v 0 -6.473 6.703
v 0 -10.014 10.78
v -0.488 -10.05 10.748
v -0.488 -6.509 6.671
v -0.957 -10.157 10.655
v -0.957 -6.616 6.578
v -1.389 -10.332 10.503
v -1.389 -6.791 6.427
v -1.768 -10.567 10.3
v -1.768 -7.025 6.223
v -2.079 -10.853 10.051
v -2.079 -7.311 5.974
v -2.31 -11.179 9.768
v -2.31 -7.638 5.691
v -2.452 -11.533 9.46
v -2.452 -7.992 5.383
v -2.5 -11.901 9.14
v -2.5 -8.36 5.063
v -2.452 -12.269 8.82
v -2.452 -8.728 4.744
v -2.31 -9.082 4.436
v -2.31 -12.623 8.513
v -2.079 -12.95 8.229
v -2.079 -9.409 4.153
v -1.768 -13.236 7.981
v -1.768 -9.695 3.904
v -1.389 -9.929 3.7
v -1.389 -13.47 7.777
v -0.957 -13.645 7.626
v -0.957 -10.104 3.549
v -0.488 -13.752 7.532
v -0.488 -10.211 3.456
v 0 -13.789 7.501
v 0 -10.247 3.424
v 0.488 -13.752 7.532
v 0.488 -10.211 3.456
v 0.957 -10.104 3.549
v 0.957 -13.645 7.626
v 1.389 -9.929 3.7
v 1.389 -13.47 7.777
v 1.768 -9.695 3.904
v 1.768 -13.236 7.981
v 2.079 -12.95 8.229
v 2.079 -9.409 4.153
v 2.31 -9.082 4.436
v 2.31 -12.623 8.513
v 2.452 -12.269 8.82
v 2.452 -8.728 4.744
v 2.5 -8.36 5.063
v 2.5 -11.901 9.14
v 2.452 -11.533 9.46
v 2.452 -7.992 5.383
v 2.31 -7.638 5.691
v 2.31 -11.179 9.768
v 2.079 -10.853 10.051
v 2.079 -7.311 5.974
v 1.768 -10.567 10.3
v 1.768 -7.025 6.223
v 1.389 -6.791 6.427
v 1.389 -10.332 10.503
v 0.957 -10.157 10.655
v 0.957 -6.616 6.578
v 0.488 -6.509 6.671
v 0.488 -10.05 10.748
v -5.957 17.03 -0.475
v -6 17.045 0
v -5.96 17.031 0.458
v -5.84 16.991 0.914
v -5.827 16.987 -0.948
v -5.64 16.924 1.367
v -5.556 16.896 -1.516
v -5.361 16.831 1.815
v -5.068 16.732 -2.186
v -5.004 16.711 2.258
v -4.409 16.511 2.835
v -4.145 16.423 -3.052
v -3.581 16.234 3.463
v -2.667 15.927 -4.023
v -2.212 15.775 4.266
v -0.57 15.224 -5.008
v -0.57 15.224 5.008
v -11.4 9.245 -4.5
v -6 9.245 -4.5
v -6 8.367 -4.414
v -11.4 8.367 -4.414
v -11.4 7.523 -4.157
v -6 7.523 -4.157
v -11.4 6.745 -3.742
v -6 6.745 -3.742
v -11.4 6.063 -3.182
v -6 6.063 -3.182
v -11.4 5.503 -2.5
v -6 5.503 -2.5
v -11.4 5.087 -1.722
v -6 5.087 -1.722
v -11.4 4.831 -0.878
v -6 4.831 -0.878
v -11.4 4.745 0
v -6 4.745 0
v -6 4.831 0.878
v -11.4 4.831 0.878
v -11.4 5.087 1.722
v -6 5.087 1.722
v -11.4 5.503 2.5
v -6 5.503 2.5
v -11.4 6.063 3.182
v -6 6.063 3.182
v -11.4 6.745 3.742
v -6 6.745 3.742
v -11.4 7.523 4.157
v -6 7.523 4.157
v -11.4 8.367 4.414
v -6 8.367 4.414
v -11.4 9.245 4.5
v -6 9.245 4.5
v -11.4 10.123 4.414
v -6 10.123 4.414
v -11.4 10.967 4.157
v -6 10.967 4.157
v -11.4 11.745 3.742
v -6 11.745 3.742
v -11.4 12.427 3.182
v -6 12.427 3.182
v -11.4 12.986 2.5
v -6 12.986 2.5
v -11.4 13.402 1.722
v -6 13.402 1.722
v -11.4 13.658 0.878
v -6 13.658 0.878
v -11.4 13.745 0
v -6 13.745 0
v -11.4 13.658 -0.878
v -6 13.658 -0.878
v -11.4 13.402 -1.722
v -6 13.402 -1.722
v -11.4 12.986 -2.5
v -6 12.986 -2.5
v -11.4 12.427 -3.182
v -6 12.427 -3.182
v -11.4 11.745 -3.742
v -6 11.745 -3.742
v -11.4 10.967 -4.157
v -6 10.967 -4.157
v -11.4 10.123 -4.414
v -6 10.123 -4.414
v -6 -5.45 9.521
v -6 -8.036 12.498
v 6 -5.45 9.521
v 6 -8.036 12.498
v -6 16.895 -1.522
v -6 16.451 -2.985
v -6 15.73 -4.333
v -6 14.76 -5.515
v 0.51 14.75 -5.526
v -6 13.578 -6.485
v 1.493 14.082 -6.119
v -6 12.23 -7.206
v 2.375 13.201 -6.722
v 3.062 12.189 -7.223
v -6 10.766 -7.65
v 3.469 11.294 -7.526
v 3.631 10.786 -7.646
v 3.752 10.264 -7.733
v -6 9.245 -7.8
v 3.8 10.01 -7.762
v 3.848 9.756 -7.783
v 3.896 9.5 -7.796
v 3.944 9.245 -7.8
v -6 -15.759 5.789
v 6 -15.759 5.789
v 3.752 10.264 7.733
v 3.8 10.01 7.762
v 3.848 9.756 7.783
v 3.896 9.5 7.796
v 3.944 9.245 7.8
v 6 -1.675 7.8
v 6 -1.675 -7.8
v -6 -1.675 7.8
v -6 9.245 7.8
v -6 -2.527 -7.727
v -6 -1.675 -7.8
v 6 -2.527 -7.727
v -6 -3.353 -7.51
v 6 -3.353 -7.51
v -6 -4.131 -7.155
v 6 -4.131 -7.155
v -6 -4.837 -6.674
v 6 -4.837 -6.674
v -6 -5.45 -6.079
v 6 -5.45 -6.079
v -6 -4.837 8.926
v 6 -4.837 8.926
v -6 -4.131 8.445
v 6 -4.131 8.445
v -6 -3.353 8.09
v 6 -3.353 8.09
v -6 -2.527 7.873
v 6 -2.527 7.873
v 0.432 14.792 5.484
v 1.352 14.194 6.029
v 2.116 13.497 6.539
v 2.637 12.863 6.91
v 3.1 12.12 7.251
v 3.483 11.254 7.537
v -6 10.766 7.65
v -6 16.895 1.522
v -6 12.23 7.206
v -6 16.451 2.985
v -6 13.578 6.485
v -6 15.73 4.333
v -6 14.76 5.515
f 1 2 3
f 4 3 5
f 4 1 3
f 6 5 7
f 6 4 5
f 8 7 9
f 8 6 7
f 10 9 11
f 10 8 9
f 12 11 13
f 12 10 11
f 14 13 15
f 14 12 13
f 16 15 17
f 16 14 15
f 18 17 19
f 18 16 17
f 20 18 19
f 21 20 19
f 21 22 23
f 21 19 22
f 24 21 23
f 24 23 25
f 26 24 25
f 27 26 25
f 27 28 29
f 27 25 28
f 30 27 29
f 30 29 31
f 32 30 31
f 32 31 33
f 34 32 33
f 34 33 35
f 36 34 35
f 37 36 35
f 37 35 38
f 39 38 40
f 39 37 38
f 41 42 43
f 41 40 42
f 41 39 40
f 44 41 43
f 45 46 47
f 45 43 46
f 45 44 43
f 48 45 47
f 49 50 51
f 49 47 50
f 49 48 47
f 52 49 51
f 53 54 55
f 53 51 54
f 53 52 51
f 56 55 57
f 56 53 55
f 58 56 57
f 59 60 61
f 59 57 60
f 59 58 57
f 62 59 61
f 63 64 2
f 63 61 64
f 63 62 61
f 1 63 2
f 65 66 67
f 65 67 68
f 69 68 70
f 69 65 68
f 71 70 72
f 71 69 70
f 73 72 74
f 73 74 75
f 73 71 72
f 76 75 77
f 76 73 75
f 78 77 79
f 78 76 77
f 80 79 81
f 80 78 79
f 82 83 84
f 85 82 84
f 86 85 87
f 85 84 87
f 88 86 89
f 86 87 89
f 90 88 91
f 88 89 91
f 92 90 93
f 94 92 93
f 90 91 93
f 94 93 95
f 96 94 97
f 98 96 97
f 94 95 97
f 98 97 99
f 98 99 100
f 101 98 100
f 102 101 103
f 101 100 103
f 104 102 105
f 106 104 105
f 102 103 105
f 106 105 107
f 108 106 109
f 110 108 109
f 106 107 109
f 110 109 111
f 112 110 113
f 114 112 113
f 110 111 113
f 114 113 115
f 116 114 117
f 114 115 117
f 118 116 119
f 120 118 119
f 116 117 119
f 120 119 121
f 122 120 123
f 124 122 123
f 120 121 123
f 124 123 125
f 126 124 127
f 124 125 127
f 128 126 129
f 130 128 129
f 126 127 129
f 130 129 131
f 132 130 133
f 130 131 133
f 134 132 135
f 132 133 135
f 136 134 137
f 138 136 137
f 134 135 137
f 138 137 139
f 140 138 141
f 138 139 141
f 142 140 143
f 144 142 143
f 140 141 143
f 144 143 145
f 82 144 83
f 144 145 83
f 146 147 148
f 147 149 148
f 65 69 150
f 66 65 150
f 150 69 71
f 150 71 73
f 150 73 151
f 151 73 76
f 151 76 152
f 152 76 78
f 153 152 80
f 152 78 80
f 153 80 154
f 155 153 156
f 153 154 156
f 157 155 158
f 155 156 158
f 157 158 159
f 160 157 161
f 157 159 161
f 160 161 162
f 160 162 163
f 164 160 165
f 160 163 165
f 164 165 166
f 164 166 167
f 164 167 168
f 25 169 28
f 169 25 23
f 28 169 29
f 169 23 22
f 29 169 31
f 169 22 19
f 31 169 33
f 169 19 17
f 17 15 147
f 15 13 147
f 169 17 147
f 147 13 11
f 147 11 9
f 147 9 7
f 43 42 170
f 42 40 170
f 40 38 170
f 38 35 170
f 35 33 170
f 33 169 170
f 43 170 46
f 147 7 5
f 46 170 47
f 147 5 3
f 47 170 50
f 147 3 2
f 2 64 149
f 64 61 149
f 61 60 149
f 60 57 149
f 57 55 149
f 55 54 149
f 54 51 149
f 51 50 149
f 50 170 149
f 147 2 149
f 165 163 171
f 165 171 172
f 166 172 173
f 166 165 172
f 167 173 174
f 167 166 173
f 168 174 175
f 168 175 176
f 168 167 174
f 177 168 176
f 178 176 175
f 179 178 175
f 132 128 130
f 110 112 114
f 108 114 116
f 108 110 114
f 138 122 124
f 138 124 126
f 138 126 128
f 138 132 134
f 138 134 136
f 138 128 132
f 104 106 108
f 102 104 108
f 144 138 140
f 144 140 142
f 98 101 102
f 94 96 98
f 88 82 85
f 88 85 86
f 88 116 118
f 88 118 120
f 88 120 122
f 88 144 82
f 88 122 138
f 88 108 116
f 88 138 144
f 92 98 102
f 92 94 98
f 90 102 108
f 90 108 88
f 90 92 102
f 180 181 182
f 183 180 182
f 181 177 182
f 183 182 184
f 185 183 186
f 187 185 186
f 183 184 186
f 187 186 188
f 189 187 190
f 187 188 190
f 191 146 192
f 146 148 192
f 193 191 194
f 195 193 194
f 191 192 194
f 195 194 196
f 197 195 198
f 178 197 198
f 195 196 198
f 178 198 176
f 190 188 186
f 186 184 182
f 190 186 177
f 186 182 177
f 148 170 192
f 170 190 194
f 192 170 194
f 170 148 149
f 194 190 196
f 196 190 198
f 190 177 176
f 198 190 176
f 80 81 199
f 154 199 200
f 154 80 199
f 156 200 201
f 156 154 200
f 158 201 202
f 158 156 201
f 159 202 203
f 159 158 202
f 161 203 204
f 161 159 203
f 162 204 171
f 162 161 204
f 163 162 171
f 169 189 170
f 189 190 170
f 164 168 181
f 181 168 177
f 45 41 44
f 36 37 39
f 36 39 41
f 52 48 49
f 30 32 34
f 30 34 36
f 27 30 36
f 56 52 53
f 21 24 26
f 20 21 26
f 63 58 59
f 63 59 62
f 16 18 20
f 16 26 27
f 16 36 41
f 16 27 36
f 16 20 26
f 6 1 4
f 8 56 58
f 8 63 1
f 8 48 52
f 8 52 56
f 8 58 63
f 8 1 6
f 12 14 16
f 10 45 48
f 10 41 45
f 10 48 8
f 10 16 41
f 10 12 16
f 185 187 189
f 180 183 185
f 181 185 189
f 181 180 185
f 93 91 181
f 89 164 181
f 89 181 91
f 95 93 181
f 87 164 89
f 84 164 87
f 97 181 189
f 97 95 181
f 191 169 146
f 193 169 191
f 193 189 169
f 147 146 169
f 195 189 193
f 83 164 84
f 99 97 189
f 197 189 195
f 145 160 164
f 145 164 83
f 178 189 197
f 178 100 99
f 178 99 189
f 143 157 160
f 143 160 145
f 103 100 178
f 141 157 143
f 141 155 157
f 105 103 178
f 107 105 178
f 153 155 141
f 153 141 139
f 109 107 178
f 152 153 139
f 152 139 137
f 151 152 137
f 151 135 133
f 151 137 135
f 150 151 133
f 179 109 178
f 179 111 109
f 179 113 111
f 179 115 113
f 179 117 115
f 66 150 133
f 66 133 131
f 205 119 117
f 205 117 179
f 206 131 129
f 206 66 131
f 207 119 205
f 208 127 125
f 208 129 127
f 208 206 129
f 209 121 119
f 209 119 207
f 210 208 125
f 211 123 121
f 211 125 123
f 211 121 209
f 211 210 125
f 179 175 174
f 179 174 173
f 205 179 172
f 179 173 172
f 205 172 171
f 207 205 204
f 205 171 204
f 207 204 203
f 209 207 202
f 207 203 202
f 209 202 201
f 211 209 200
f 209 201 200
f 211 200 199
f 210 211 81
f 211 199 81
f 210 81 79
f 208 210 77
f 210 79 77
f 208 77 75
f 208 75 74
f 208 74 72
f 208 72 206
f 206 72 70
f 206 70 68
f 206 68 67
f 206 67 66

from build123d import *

# Parameters (mm, degrees)
SALIENTE_EXTRUIR1_DEPTH    = 6
CORTAR_EXTRUIR1_DEPTH      = 22.970816212
CORTAR_EXTRUIR1_DEPTH_BACK = 22.970816212
CORTAR_EXTRUIR2_DEPTH      = 34.249140271
CORTAR_EXTRUIR2_DEPTH_BACK = 5.4
CROQUIS4_R                 = 2.5
CROQUIS5_R                 = 4.5
SALIENTE_EXTRUIR2_DEPTH    = 5.4


with BuildPart() as part:
    # Croquis2 → Saliente-Extruir1 (new, symmetric)
    with BuildSketch(Plane(origin=(0, 0, 0), x_dir=(0, 0, -1), z_dir=(1, 0, 0))):
        with BuildLine():
            Line((7.8, 9.244722598), (7.8, -1.675439815))
            ThreePointArc((7.8, -1.675439815), (7.349392081, -3.749814828), (6.078787323, -5.450297917))
            Line((6.078787323, -5.450297917), (-5.789489169, -15.758911763))
            Line((-5.789489169, -15.758911763), (-12.497767664, -8.035690663))
            Line((-12.497767664, -8.035690663), (-9.521212677, -5.450297917))
            ThreePointArc((-9.521212677, -5.450297917), (-8.250607919, -3.749814828), (-7.8, -1.675439815))
            Line((-7.8, -1.675439815), (-7.8, 9.244722598))
            ThreePointArc((-7.8, 9.244722598), (0, 17.044722598), (7.8, 9.244722598))
        make_face()
    extrude(amount=SALIENTE_EXTRUIR1_DEPTH, both=True)

    # Croquis3 → Cortar-Extruir1 (cut, two sides: drawn at the far end of the back side and taken through both)
    with BuildSketch(Plane.XY.offset(-CORTAR_EXTRUIR1_DEPTH_BACK)):
        with BuildLine():
            Line((-6, 17.044722598), (-0.5698886, 15.224393056))
            ThreePointArc((-0.5698886, 15.224393056), (2.264862856, 13.331444594), (3.751873119, 10.264219435))
            Line((3.751873119, 10.264219435), (6, -1.675439815))
            Line((6, -1.675439815), (6, 17.044722598))
            Line((6, 17.044722598), (-6, 17.044722598))
        make_face()
    extrude(amount=CORTAR_EXTRUIR1_DEPTH + CORTAR_EXTRUIR1_DEPTH_BACK, mode=Mode.SUBTRACT)

    # Croquis4 → Cortar-Extruir2 (cut, two sides: drawn at the far end of the back side and taken through both)
    with BuildSketch(Plane(origin=(0, -9.642863705, 11.101800332), x_dir=(1, 0, 0), z_dir=(0, -0.6557574645123035, 0.7549716204841048)).offset(-CORTAR_EXTRUIR2_DEPTH_BACK)):
        with Locations(Location((0, -2.991213966, 0), (0, 0, 90))):
            Circle(CROQUIS4_R)
    extrude(amount=CORTAR_EXTRUIR2_DEPTH + CORTAR_EXTRUIR2_DEPTH_BACK, mode=Mode.SUBTRACT)

    # Croquis5 → Saliente-Extruir2 (add)
    with BuildSketch(Plane.ZY.offset(6)):
        with Locations(Location((0, 9.244722598, 0), (0, 0, 180))):
            Circle(CROQUIS5_R)
    extrude(amount=SALIENTE_EXTRUIR2_DEPTH)


solid = part.part
